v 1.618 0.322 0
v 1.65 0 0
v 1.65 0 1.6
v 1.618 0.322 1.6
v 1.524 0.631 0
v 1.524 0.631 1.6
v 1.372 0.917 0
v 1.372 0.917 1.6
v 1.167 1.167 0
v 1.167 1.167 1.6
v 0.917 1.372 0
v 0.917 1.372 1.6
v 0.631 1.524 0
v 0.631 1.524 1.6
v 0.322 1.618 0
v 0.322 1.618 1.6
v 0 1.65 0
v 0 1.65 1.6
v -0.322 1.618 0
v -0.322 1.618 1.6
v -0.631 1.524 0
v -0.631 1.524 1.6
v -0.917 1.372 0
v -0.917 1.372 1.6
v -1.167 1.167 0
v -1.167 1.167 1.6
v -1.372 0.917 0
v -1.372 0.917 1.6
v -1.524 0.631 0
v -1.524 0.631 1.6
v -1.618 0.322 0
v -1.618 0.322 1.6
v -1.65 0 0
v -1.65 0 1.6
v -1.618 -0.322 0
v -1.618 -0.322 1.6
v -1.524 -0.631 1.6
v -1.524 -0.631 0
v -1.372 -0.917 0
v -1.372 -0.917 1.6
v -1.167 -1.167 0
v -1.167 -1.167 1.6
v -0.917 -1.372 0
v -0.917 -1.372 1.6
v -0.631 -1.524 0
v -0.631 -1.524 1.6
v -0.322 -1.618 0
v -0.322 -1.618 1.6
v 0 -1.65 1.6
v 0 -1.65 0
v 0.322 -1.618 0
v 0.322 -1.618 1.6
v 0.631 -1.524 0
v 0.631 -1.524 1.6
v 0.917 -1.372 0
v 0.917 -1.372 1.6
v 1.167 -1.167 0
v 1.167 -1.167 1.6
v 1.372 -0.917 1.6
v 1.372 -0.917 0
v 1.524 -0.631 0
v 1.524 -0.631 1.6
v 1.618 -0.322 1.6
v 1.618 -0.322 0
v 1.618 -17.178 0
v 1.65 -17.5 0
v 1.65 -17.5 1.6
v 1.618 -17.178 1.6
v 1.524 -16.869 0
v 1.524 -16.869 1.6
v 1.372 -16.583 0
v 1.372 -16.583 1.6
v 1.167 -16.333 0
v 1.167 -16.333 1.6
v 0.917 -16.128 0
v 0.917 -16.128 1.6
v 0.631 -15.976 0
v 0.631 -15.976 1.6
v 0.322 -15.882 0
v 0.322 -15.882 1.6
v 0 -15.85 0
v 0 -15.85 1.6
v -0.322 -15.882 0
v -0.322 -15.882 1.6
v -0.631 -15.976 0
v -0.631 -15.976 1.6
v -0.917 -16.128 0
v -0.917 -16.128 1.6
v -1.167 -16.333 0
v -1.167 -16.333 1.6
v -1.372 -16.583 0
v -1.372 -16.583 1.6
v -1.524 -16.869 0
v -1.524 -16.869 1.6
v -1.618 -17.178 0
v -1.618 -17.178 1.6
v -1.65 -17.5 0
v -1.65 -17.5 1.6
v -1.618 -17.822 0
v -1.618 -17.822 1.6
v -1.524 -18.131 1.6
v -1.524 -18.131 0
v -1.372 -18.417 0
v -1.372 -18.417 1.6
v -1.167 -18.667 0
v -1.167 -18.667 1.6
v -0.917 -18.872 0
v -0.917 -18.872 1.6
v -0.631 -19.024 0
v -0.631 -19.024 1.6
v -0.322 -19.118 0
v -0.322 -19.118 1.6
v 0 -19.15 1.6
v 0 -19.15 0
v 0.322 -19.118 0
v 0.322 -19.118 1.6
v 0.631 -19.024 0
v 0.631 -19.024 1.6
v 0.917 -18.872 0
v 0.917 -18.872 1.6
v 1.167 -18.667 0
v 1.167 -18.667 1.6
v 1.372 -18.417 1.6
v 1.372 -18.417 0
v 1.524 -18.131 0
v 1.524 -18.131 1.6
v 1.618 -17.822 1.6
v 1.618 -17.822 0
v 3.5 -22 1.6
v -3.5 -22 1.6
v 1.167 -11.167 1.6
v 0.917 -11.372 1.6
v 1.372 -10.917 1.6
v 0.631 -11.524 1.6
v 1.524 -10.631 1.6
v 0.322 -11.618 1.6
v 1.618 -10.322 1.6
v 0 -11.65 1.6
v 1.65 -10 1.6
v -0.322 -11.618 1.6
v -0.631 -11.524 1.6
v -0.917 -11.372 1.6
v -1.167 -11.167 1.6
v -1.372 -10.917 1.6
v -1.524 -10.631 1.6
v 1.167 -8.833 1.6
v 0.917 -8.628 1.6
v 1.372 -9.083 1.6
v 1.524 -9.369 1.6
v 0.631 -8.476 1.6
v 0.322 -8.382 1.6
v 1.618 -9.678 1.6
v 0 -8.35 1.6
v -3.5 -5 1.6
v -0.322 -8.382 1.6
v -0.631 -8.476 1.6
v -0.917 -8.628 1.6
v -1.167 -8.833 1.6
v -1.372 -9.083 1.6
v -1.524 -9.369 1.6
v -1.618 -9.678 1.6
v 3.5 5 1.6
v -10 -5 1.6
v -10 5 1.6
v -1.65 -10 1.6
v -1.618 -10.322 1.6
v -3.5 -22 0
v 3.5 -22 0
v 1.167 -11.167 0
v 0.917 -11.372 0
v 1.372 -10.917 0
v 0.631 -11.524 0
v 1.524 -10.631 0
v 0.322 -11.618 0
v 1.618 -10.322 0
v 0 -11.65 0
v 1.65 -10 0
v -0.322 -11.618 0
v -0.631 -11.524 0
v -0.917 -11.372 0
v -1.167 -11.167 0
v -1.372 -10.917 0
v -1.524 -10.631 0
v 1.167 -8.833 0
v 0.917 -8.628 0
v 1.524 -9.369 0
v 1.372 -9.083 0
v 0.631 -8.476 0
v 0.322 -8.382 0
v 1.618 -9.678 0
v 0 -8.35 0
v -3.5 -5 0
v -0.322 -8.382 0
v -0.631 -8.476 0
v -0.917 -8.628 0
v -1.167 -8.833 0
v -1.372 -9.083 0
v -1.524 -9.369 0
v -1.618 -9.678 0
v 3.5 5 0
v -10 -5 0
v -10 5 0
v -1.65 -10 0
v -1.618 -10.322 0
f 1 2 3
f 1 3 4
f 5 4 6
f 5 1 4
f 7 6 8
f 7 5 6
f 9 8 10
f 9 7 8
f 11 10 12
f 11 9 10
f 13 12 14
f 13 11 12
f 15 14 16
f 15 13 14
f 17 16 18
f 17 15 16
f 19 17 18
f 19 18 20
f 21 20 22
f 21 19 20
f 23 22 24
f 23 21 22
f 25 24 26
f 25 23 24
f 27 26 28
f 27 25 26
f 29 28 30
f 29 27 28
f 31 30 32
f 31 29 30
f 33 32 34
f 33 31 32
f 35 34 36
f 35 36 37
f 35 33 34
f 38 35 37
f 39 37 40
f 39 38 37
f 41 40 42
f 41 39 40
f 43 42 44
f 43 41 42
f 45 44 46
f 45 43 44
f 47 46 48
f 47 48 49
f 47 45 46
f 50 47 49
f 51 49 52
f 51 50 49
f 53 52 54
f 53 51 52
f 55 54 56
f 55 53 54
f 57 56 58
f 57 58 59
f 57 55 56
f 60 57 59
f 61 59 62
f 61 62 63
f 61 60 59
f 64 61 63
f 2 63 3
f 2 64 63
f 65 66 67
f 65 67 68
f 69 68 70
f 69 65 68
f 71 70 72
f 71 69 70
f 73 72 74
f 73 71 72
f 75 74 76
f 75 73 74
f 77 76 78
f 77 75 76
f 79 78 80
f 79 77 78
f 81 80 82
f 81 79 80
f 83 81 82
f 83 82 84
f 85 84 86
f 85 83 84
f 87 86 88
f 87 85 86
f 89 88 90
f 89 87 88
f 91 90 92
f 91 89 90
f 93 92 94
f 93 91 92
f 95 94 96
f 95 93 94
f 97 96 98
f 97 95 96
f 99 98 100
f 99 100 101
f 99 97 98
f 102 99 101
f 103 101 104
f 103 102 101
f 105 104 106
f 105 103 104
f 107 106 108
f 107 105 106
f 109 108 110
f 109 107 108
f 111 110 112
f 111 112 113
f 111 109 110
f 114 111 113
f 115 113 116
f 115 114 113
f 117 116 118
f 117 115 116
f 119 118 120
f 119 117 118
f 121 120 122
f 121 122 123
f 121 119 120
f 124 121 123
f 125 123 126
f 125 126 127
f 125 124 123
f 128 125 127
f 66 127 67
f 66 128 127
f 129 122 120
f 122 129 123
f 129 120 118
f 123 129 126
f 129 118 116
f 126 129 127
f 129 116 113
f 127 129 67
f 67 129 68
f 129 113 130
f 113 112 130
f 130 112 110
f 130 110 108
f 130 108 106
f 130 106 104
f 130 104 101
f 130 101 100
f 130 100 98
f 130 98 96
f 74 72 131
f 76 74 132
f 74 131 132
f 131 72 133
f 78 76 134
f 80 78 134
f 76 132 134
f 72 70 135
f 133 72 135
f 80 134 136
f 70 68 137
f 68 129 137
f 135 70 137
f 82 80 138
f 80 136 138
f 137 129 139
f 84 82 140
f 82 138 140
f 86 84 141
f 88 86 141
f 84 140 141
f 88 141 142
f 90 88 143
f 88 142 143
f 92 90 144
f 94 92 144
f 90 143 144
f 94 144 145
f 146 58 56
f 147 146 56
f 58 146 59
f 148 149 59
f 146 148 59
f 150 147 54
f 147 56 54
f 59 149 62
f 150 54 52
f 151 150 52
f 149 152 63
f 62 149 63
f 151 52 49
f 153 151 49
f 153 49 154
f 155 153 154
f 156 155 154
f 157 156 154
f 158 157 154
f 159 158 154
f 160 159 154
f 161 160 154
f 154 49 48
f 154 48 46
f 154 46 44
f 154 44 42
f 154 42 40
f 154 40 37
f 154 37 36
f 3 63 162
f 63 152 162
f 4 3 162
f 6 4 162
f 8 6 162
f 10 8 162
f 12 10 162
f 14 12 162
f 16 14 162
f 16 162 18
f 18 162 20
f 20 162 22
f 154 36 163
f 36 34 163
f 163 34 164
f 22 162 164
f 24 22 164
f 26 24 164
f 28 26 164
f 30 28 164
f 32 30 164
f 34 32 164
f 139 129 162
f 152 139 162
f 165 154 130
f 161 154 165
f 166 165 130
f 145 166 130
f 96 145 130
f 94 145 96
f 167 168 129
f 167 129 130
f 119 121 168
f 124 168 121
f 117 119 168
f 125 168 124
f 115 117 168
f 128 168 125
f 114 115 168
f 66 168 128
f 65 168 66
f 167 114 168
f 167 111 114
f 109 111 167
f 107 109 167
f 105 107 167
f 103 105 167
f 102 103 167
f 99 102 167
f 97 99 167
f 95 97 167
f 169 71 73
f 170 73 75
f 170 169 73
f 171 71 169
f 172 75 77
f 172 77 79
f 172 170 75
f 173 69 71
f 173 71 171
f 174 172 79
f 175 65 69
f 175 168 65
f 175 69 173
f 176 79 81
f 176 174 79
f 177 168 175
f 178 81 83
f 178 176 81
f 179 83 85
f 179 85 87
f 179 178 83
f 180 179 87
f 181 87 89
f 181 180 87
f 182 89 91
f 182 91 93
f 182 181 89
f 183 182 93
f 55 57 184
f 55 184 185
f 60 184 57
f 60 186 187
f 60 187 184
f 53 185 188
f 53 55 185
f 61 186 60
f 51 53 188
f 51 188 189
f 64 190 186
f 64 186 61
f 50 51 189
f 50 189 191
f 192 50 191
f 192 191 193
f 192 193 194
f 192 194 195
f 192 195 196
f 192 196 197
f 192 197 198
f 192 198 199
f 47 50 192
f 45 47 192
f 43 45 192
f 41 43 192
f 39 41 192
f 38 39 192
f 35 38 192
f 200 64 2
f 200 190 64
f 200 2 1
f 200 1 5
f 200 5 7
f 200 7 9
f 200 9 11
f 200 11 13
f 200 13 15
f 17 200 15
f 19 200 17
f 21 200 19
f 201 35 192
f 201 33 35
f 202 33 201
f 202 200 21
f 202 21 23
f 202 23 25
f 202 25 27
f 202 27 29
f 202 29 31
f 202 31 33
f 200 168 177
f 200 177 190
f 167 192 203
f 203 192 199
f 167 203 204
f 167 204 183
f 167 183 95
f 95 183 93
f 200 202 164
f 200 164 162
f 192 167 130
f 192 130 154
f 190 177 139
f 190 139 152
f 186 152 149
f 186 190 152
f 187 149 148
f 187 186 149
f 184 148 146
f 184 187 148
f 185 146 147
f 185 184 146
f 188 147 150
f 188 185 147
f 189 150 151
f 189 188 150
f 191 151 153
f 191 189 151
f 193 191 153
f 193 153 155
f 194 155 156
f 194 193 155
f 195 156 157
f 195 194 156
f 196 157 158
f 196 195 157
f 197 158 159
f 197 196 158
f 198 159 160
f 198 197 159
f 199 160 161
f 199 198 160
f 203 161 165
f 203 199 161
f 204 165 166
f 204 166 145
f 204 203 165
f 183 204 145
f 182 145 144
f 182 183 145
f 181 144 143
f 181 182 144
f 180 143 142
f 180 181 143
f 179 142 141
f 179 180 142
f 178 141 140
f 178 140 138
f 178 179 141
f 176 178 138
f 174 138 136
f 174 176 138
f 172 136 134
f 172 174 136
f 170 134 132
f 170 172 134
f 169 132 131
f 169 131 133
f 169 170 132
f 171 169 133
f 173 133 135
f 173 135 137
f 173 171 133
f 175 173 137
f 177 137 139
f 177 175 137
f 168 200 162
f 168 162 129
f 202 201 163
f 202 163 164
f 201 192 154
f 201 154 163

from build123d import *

# Parameters (mm, degrees)
SKETCH_R  = 1.65
PAD_DEPTH = 1.6


with BuildPart() as part:
    # Sketch → Pad (new body)
    with BuildSketch(Plane.XY):
        Polygon((3.5, 5), (3.5, -22), (-3.5, -22), (-3.5, -5), (-10, -5), (-10, 5), align=None)
        Circle(SKETCH_R, mode=Mode.SUBTRACT)
        with Locations((0, -10)):
            Circle(SKETCH_R, mode=Mode.SUBTRACT)
        with Locations((0, -17.5)):
            Circle(SKETCH_R, mode=Mode.SUBTRACT)
    extrude(amount=PAD_DEPTH)


solid = part.part
